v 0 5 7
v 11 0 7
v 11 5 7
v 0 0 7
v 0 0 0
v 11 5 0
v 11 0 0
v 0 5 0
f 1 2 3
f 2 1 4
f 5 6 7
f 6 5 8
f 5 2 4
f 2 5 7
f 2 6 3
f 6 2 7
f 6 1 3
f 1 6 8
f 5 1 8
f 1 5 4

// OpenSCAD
// Generated by SolidPython 1.0.1 on 2020-07-29 00:46:55


cube(size = [11, 5, 7]);
/***********************************************
*********      SolidPython code:      **********
************************************************
 
# import packages: SolidPython
from solid import *
from solid.utils import *
from itertools import chain, combinations, permutations


class Resize:

    def __init__(self, scad_file):
        self.scad_file = scad_file
        #self.scad_file = import_scad(scad_file)
        # cone/cylinder param:
        self.r1 = 0
        self.r2 = 0
        self.h = 0
        # rectangular prism param:
        self.w = 0
        self.l = 0
        # ellipse param:
        self.r = 0

    # import OpenScad code (file name corresponds to shape)


    # classify shape + parameters
    def assign(self, param1, param2, param3):
        if self.scad_file == 'cone.scad':
            self.r1 = param1
            self.r2 = param2
            self.h = param3
        elif self.scad_file == 'cylinder.scad':
            self.r1 = param1
            self.r2 = param2
            self.h = param3
        elif self.scad_file == 'rectangularPrism.scad':
            self.h = param1
            self.l = param2
            self.w = param3
        else:
            self.r = param1
            self.h = param2

    # resize parameters
    def iterate(self):
        x = range(3, 20, 2)
        i = 1
        if self.scad_file == 'cone.scad':
            tempList = list(permutations(x, 2))
            for temp in tempList:
                param1 = temp[0]
                param2 = temp[1]
                filepath = 'produced_scad_files/' + 'cone' + str(param1) + '_' + str(param2) + '_' + '.scad'
                scad_render_to_file(cylinder(h=param1, r1=param2, r2=0), filepath)

        elif self.scad_file == 'cylinder.scad':
            tempList = list(permutations(x, 3))
            for temp in tempList:
                param1 = temp[0]
                param2 = temp[1]
                filepath = 'produced_scad_files/' + 'cylinder' + str(param1) + '_' + str(param2) + '_' + '.scad'
                scad_render_to_file(cylinder(h=param1, r1=param2, r2=param2), filepath)

        elif self.scad_file == 'rectangularPrism.scad':
            tempList = list(permutations(x, 3))
            for temp in tempList:
                param1 = temp[0]
                param2 = temp[1]
                param3 = temp[2]
                filepath = 'produced_scad_files/' + 'rectangularPrism' + str(param1) + '_' + str(param2) + '_' + str(
                    param3) + '.scad'
                scad_render_to_file(cube(size=(param1, param2, param3)), filepath)

        elif self.scad_file == 'ellipse.scad':
            tempList = list(permutations(x, 4))
            for temp in tempList:
                param1 = temp[0]
                param2 = temp[1]
                param3 = temp[2]
                param4 = temp[3]
                filepath = 'produced_scad_files/' + 'ellipse' + str(param1) + '_' + str(param2) + '_' + str(param3) + '_' + str(param4) + '.scad'
                scad_render_to_file(scale([param1, param2, param3])(sphere(r=param4)), filepath)

    def render_to_scadfile(self):
        scad_render_to_file(scad, 'example.scad') 
 
************************************************/
